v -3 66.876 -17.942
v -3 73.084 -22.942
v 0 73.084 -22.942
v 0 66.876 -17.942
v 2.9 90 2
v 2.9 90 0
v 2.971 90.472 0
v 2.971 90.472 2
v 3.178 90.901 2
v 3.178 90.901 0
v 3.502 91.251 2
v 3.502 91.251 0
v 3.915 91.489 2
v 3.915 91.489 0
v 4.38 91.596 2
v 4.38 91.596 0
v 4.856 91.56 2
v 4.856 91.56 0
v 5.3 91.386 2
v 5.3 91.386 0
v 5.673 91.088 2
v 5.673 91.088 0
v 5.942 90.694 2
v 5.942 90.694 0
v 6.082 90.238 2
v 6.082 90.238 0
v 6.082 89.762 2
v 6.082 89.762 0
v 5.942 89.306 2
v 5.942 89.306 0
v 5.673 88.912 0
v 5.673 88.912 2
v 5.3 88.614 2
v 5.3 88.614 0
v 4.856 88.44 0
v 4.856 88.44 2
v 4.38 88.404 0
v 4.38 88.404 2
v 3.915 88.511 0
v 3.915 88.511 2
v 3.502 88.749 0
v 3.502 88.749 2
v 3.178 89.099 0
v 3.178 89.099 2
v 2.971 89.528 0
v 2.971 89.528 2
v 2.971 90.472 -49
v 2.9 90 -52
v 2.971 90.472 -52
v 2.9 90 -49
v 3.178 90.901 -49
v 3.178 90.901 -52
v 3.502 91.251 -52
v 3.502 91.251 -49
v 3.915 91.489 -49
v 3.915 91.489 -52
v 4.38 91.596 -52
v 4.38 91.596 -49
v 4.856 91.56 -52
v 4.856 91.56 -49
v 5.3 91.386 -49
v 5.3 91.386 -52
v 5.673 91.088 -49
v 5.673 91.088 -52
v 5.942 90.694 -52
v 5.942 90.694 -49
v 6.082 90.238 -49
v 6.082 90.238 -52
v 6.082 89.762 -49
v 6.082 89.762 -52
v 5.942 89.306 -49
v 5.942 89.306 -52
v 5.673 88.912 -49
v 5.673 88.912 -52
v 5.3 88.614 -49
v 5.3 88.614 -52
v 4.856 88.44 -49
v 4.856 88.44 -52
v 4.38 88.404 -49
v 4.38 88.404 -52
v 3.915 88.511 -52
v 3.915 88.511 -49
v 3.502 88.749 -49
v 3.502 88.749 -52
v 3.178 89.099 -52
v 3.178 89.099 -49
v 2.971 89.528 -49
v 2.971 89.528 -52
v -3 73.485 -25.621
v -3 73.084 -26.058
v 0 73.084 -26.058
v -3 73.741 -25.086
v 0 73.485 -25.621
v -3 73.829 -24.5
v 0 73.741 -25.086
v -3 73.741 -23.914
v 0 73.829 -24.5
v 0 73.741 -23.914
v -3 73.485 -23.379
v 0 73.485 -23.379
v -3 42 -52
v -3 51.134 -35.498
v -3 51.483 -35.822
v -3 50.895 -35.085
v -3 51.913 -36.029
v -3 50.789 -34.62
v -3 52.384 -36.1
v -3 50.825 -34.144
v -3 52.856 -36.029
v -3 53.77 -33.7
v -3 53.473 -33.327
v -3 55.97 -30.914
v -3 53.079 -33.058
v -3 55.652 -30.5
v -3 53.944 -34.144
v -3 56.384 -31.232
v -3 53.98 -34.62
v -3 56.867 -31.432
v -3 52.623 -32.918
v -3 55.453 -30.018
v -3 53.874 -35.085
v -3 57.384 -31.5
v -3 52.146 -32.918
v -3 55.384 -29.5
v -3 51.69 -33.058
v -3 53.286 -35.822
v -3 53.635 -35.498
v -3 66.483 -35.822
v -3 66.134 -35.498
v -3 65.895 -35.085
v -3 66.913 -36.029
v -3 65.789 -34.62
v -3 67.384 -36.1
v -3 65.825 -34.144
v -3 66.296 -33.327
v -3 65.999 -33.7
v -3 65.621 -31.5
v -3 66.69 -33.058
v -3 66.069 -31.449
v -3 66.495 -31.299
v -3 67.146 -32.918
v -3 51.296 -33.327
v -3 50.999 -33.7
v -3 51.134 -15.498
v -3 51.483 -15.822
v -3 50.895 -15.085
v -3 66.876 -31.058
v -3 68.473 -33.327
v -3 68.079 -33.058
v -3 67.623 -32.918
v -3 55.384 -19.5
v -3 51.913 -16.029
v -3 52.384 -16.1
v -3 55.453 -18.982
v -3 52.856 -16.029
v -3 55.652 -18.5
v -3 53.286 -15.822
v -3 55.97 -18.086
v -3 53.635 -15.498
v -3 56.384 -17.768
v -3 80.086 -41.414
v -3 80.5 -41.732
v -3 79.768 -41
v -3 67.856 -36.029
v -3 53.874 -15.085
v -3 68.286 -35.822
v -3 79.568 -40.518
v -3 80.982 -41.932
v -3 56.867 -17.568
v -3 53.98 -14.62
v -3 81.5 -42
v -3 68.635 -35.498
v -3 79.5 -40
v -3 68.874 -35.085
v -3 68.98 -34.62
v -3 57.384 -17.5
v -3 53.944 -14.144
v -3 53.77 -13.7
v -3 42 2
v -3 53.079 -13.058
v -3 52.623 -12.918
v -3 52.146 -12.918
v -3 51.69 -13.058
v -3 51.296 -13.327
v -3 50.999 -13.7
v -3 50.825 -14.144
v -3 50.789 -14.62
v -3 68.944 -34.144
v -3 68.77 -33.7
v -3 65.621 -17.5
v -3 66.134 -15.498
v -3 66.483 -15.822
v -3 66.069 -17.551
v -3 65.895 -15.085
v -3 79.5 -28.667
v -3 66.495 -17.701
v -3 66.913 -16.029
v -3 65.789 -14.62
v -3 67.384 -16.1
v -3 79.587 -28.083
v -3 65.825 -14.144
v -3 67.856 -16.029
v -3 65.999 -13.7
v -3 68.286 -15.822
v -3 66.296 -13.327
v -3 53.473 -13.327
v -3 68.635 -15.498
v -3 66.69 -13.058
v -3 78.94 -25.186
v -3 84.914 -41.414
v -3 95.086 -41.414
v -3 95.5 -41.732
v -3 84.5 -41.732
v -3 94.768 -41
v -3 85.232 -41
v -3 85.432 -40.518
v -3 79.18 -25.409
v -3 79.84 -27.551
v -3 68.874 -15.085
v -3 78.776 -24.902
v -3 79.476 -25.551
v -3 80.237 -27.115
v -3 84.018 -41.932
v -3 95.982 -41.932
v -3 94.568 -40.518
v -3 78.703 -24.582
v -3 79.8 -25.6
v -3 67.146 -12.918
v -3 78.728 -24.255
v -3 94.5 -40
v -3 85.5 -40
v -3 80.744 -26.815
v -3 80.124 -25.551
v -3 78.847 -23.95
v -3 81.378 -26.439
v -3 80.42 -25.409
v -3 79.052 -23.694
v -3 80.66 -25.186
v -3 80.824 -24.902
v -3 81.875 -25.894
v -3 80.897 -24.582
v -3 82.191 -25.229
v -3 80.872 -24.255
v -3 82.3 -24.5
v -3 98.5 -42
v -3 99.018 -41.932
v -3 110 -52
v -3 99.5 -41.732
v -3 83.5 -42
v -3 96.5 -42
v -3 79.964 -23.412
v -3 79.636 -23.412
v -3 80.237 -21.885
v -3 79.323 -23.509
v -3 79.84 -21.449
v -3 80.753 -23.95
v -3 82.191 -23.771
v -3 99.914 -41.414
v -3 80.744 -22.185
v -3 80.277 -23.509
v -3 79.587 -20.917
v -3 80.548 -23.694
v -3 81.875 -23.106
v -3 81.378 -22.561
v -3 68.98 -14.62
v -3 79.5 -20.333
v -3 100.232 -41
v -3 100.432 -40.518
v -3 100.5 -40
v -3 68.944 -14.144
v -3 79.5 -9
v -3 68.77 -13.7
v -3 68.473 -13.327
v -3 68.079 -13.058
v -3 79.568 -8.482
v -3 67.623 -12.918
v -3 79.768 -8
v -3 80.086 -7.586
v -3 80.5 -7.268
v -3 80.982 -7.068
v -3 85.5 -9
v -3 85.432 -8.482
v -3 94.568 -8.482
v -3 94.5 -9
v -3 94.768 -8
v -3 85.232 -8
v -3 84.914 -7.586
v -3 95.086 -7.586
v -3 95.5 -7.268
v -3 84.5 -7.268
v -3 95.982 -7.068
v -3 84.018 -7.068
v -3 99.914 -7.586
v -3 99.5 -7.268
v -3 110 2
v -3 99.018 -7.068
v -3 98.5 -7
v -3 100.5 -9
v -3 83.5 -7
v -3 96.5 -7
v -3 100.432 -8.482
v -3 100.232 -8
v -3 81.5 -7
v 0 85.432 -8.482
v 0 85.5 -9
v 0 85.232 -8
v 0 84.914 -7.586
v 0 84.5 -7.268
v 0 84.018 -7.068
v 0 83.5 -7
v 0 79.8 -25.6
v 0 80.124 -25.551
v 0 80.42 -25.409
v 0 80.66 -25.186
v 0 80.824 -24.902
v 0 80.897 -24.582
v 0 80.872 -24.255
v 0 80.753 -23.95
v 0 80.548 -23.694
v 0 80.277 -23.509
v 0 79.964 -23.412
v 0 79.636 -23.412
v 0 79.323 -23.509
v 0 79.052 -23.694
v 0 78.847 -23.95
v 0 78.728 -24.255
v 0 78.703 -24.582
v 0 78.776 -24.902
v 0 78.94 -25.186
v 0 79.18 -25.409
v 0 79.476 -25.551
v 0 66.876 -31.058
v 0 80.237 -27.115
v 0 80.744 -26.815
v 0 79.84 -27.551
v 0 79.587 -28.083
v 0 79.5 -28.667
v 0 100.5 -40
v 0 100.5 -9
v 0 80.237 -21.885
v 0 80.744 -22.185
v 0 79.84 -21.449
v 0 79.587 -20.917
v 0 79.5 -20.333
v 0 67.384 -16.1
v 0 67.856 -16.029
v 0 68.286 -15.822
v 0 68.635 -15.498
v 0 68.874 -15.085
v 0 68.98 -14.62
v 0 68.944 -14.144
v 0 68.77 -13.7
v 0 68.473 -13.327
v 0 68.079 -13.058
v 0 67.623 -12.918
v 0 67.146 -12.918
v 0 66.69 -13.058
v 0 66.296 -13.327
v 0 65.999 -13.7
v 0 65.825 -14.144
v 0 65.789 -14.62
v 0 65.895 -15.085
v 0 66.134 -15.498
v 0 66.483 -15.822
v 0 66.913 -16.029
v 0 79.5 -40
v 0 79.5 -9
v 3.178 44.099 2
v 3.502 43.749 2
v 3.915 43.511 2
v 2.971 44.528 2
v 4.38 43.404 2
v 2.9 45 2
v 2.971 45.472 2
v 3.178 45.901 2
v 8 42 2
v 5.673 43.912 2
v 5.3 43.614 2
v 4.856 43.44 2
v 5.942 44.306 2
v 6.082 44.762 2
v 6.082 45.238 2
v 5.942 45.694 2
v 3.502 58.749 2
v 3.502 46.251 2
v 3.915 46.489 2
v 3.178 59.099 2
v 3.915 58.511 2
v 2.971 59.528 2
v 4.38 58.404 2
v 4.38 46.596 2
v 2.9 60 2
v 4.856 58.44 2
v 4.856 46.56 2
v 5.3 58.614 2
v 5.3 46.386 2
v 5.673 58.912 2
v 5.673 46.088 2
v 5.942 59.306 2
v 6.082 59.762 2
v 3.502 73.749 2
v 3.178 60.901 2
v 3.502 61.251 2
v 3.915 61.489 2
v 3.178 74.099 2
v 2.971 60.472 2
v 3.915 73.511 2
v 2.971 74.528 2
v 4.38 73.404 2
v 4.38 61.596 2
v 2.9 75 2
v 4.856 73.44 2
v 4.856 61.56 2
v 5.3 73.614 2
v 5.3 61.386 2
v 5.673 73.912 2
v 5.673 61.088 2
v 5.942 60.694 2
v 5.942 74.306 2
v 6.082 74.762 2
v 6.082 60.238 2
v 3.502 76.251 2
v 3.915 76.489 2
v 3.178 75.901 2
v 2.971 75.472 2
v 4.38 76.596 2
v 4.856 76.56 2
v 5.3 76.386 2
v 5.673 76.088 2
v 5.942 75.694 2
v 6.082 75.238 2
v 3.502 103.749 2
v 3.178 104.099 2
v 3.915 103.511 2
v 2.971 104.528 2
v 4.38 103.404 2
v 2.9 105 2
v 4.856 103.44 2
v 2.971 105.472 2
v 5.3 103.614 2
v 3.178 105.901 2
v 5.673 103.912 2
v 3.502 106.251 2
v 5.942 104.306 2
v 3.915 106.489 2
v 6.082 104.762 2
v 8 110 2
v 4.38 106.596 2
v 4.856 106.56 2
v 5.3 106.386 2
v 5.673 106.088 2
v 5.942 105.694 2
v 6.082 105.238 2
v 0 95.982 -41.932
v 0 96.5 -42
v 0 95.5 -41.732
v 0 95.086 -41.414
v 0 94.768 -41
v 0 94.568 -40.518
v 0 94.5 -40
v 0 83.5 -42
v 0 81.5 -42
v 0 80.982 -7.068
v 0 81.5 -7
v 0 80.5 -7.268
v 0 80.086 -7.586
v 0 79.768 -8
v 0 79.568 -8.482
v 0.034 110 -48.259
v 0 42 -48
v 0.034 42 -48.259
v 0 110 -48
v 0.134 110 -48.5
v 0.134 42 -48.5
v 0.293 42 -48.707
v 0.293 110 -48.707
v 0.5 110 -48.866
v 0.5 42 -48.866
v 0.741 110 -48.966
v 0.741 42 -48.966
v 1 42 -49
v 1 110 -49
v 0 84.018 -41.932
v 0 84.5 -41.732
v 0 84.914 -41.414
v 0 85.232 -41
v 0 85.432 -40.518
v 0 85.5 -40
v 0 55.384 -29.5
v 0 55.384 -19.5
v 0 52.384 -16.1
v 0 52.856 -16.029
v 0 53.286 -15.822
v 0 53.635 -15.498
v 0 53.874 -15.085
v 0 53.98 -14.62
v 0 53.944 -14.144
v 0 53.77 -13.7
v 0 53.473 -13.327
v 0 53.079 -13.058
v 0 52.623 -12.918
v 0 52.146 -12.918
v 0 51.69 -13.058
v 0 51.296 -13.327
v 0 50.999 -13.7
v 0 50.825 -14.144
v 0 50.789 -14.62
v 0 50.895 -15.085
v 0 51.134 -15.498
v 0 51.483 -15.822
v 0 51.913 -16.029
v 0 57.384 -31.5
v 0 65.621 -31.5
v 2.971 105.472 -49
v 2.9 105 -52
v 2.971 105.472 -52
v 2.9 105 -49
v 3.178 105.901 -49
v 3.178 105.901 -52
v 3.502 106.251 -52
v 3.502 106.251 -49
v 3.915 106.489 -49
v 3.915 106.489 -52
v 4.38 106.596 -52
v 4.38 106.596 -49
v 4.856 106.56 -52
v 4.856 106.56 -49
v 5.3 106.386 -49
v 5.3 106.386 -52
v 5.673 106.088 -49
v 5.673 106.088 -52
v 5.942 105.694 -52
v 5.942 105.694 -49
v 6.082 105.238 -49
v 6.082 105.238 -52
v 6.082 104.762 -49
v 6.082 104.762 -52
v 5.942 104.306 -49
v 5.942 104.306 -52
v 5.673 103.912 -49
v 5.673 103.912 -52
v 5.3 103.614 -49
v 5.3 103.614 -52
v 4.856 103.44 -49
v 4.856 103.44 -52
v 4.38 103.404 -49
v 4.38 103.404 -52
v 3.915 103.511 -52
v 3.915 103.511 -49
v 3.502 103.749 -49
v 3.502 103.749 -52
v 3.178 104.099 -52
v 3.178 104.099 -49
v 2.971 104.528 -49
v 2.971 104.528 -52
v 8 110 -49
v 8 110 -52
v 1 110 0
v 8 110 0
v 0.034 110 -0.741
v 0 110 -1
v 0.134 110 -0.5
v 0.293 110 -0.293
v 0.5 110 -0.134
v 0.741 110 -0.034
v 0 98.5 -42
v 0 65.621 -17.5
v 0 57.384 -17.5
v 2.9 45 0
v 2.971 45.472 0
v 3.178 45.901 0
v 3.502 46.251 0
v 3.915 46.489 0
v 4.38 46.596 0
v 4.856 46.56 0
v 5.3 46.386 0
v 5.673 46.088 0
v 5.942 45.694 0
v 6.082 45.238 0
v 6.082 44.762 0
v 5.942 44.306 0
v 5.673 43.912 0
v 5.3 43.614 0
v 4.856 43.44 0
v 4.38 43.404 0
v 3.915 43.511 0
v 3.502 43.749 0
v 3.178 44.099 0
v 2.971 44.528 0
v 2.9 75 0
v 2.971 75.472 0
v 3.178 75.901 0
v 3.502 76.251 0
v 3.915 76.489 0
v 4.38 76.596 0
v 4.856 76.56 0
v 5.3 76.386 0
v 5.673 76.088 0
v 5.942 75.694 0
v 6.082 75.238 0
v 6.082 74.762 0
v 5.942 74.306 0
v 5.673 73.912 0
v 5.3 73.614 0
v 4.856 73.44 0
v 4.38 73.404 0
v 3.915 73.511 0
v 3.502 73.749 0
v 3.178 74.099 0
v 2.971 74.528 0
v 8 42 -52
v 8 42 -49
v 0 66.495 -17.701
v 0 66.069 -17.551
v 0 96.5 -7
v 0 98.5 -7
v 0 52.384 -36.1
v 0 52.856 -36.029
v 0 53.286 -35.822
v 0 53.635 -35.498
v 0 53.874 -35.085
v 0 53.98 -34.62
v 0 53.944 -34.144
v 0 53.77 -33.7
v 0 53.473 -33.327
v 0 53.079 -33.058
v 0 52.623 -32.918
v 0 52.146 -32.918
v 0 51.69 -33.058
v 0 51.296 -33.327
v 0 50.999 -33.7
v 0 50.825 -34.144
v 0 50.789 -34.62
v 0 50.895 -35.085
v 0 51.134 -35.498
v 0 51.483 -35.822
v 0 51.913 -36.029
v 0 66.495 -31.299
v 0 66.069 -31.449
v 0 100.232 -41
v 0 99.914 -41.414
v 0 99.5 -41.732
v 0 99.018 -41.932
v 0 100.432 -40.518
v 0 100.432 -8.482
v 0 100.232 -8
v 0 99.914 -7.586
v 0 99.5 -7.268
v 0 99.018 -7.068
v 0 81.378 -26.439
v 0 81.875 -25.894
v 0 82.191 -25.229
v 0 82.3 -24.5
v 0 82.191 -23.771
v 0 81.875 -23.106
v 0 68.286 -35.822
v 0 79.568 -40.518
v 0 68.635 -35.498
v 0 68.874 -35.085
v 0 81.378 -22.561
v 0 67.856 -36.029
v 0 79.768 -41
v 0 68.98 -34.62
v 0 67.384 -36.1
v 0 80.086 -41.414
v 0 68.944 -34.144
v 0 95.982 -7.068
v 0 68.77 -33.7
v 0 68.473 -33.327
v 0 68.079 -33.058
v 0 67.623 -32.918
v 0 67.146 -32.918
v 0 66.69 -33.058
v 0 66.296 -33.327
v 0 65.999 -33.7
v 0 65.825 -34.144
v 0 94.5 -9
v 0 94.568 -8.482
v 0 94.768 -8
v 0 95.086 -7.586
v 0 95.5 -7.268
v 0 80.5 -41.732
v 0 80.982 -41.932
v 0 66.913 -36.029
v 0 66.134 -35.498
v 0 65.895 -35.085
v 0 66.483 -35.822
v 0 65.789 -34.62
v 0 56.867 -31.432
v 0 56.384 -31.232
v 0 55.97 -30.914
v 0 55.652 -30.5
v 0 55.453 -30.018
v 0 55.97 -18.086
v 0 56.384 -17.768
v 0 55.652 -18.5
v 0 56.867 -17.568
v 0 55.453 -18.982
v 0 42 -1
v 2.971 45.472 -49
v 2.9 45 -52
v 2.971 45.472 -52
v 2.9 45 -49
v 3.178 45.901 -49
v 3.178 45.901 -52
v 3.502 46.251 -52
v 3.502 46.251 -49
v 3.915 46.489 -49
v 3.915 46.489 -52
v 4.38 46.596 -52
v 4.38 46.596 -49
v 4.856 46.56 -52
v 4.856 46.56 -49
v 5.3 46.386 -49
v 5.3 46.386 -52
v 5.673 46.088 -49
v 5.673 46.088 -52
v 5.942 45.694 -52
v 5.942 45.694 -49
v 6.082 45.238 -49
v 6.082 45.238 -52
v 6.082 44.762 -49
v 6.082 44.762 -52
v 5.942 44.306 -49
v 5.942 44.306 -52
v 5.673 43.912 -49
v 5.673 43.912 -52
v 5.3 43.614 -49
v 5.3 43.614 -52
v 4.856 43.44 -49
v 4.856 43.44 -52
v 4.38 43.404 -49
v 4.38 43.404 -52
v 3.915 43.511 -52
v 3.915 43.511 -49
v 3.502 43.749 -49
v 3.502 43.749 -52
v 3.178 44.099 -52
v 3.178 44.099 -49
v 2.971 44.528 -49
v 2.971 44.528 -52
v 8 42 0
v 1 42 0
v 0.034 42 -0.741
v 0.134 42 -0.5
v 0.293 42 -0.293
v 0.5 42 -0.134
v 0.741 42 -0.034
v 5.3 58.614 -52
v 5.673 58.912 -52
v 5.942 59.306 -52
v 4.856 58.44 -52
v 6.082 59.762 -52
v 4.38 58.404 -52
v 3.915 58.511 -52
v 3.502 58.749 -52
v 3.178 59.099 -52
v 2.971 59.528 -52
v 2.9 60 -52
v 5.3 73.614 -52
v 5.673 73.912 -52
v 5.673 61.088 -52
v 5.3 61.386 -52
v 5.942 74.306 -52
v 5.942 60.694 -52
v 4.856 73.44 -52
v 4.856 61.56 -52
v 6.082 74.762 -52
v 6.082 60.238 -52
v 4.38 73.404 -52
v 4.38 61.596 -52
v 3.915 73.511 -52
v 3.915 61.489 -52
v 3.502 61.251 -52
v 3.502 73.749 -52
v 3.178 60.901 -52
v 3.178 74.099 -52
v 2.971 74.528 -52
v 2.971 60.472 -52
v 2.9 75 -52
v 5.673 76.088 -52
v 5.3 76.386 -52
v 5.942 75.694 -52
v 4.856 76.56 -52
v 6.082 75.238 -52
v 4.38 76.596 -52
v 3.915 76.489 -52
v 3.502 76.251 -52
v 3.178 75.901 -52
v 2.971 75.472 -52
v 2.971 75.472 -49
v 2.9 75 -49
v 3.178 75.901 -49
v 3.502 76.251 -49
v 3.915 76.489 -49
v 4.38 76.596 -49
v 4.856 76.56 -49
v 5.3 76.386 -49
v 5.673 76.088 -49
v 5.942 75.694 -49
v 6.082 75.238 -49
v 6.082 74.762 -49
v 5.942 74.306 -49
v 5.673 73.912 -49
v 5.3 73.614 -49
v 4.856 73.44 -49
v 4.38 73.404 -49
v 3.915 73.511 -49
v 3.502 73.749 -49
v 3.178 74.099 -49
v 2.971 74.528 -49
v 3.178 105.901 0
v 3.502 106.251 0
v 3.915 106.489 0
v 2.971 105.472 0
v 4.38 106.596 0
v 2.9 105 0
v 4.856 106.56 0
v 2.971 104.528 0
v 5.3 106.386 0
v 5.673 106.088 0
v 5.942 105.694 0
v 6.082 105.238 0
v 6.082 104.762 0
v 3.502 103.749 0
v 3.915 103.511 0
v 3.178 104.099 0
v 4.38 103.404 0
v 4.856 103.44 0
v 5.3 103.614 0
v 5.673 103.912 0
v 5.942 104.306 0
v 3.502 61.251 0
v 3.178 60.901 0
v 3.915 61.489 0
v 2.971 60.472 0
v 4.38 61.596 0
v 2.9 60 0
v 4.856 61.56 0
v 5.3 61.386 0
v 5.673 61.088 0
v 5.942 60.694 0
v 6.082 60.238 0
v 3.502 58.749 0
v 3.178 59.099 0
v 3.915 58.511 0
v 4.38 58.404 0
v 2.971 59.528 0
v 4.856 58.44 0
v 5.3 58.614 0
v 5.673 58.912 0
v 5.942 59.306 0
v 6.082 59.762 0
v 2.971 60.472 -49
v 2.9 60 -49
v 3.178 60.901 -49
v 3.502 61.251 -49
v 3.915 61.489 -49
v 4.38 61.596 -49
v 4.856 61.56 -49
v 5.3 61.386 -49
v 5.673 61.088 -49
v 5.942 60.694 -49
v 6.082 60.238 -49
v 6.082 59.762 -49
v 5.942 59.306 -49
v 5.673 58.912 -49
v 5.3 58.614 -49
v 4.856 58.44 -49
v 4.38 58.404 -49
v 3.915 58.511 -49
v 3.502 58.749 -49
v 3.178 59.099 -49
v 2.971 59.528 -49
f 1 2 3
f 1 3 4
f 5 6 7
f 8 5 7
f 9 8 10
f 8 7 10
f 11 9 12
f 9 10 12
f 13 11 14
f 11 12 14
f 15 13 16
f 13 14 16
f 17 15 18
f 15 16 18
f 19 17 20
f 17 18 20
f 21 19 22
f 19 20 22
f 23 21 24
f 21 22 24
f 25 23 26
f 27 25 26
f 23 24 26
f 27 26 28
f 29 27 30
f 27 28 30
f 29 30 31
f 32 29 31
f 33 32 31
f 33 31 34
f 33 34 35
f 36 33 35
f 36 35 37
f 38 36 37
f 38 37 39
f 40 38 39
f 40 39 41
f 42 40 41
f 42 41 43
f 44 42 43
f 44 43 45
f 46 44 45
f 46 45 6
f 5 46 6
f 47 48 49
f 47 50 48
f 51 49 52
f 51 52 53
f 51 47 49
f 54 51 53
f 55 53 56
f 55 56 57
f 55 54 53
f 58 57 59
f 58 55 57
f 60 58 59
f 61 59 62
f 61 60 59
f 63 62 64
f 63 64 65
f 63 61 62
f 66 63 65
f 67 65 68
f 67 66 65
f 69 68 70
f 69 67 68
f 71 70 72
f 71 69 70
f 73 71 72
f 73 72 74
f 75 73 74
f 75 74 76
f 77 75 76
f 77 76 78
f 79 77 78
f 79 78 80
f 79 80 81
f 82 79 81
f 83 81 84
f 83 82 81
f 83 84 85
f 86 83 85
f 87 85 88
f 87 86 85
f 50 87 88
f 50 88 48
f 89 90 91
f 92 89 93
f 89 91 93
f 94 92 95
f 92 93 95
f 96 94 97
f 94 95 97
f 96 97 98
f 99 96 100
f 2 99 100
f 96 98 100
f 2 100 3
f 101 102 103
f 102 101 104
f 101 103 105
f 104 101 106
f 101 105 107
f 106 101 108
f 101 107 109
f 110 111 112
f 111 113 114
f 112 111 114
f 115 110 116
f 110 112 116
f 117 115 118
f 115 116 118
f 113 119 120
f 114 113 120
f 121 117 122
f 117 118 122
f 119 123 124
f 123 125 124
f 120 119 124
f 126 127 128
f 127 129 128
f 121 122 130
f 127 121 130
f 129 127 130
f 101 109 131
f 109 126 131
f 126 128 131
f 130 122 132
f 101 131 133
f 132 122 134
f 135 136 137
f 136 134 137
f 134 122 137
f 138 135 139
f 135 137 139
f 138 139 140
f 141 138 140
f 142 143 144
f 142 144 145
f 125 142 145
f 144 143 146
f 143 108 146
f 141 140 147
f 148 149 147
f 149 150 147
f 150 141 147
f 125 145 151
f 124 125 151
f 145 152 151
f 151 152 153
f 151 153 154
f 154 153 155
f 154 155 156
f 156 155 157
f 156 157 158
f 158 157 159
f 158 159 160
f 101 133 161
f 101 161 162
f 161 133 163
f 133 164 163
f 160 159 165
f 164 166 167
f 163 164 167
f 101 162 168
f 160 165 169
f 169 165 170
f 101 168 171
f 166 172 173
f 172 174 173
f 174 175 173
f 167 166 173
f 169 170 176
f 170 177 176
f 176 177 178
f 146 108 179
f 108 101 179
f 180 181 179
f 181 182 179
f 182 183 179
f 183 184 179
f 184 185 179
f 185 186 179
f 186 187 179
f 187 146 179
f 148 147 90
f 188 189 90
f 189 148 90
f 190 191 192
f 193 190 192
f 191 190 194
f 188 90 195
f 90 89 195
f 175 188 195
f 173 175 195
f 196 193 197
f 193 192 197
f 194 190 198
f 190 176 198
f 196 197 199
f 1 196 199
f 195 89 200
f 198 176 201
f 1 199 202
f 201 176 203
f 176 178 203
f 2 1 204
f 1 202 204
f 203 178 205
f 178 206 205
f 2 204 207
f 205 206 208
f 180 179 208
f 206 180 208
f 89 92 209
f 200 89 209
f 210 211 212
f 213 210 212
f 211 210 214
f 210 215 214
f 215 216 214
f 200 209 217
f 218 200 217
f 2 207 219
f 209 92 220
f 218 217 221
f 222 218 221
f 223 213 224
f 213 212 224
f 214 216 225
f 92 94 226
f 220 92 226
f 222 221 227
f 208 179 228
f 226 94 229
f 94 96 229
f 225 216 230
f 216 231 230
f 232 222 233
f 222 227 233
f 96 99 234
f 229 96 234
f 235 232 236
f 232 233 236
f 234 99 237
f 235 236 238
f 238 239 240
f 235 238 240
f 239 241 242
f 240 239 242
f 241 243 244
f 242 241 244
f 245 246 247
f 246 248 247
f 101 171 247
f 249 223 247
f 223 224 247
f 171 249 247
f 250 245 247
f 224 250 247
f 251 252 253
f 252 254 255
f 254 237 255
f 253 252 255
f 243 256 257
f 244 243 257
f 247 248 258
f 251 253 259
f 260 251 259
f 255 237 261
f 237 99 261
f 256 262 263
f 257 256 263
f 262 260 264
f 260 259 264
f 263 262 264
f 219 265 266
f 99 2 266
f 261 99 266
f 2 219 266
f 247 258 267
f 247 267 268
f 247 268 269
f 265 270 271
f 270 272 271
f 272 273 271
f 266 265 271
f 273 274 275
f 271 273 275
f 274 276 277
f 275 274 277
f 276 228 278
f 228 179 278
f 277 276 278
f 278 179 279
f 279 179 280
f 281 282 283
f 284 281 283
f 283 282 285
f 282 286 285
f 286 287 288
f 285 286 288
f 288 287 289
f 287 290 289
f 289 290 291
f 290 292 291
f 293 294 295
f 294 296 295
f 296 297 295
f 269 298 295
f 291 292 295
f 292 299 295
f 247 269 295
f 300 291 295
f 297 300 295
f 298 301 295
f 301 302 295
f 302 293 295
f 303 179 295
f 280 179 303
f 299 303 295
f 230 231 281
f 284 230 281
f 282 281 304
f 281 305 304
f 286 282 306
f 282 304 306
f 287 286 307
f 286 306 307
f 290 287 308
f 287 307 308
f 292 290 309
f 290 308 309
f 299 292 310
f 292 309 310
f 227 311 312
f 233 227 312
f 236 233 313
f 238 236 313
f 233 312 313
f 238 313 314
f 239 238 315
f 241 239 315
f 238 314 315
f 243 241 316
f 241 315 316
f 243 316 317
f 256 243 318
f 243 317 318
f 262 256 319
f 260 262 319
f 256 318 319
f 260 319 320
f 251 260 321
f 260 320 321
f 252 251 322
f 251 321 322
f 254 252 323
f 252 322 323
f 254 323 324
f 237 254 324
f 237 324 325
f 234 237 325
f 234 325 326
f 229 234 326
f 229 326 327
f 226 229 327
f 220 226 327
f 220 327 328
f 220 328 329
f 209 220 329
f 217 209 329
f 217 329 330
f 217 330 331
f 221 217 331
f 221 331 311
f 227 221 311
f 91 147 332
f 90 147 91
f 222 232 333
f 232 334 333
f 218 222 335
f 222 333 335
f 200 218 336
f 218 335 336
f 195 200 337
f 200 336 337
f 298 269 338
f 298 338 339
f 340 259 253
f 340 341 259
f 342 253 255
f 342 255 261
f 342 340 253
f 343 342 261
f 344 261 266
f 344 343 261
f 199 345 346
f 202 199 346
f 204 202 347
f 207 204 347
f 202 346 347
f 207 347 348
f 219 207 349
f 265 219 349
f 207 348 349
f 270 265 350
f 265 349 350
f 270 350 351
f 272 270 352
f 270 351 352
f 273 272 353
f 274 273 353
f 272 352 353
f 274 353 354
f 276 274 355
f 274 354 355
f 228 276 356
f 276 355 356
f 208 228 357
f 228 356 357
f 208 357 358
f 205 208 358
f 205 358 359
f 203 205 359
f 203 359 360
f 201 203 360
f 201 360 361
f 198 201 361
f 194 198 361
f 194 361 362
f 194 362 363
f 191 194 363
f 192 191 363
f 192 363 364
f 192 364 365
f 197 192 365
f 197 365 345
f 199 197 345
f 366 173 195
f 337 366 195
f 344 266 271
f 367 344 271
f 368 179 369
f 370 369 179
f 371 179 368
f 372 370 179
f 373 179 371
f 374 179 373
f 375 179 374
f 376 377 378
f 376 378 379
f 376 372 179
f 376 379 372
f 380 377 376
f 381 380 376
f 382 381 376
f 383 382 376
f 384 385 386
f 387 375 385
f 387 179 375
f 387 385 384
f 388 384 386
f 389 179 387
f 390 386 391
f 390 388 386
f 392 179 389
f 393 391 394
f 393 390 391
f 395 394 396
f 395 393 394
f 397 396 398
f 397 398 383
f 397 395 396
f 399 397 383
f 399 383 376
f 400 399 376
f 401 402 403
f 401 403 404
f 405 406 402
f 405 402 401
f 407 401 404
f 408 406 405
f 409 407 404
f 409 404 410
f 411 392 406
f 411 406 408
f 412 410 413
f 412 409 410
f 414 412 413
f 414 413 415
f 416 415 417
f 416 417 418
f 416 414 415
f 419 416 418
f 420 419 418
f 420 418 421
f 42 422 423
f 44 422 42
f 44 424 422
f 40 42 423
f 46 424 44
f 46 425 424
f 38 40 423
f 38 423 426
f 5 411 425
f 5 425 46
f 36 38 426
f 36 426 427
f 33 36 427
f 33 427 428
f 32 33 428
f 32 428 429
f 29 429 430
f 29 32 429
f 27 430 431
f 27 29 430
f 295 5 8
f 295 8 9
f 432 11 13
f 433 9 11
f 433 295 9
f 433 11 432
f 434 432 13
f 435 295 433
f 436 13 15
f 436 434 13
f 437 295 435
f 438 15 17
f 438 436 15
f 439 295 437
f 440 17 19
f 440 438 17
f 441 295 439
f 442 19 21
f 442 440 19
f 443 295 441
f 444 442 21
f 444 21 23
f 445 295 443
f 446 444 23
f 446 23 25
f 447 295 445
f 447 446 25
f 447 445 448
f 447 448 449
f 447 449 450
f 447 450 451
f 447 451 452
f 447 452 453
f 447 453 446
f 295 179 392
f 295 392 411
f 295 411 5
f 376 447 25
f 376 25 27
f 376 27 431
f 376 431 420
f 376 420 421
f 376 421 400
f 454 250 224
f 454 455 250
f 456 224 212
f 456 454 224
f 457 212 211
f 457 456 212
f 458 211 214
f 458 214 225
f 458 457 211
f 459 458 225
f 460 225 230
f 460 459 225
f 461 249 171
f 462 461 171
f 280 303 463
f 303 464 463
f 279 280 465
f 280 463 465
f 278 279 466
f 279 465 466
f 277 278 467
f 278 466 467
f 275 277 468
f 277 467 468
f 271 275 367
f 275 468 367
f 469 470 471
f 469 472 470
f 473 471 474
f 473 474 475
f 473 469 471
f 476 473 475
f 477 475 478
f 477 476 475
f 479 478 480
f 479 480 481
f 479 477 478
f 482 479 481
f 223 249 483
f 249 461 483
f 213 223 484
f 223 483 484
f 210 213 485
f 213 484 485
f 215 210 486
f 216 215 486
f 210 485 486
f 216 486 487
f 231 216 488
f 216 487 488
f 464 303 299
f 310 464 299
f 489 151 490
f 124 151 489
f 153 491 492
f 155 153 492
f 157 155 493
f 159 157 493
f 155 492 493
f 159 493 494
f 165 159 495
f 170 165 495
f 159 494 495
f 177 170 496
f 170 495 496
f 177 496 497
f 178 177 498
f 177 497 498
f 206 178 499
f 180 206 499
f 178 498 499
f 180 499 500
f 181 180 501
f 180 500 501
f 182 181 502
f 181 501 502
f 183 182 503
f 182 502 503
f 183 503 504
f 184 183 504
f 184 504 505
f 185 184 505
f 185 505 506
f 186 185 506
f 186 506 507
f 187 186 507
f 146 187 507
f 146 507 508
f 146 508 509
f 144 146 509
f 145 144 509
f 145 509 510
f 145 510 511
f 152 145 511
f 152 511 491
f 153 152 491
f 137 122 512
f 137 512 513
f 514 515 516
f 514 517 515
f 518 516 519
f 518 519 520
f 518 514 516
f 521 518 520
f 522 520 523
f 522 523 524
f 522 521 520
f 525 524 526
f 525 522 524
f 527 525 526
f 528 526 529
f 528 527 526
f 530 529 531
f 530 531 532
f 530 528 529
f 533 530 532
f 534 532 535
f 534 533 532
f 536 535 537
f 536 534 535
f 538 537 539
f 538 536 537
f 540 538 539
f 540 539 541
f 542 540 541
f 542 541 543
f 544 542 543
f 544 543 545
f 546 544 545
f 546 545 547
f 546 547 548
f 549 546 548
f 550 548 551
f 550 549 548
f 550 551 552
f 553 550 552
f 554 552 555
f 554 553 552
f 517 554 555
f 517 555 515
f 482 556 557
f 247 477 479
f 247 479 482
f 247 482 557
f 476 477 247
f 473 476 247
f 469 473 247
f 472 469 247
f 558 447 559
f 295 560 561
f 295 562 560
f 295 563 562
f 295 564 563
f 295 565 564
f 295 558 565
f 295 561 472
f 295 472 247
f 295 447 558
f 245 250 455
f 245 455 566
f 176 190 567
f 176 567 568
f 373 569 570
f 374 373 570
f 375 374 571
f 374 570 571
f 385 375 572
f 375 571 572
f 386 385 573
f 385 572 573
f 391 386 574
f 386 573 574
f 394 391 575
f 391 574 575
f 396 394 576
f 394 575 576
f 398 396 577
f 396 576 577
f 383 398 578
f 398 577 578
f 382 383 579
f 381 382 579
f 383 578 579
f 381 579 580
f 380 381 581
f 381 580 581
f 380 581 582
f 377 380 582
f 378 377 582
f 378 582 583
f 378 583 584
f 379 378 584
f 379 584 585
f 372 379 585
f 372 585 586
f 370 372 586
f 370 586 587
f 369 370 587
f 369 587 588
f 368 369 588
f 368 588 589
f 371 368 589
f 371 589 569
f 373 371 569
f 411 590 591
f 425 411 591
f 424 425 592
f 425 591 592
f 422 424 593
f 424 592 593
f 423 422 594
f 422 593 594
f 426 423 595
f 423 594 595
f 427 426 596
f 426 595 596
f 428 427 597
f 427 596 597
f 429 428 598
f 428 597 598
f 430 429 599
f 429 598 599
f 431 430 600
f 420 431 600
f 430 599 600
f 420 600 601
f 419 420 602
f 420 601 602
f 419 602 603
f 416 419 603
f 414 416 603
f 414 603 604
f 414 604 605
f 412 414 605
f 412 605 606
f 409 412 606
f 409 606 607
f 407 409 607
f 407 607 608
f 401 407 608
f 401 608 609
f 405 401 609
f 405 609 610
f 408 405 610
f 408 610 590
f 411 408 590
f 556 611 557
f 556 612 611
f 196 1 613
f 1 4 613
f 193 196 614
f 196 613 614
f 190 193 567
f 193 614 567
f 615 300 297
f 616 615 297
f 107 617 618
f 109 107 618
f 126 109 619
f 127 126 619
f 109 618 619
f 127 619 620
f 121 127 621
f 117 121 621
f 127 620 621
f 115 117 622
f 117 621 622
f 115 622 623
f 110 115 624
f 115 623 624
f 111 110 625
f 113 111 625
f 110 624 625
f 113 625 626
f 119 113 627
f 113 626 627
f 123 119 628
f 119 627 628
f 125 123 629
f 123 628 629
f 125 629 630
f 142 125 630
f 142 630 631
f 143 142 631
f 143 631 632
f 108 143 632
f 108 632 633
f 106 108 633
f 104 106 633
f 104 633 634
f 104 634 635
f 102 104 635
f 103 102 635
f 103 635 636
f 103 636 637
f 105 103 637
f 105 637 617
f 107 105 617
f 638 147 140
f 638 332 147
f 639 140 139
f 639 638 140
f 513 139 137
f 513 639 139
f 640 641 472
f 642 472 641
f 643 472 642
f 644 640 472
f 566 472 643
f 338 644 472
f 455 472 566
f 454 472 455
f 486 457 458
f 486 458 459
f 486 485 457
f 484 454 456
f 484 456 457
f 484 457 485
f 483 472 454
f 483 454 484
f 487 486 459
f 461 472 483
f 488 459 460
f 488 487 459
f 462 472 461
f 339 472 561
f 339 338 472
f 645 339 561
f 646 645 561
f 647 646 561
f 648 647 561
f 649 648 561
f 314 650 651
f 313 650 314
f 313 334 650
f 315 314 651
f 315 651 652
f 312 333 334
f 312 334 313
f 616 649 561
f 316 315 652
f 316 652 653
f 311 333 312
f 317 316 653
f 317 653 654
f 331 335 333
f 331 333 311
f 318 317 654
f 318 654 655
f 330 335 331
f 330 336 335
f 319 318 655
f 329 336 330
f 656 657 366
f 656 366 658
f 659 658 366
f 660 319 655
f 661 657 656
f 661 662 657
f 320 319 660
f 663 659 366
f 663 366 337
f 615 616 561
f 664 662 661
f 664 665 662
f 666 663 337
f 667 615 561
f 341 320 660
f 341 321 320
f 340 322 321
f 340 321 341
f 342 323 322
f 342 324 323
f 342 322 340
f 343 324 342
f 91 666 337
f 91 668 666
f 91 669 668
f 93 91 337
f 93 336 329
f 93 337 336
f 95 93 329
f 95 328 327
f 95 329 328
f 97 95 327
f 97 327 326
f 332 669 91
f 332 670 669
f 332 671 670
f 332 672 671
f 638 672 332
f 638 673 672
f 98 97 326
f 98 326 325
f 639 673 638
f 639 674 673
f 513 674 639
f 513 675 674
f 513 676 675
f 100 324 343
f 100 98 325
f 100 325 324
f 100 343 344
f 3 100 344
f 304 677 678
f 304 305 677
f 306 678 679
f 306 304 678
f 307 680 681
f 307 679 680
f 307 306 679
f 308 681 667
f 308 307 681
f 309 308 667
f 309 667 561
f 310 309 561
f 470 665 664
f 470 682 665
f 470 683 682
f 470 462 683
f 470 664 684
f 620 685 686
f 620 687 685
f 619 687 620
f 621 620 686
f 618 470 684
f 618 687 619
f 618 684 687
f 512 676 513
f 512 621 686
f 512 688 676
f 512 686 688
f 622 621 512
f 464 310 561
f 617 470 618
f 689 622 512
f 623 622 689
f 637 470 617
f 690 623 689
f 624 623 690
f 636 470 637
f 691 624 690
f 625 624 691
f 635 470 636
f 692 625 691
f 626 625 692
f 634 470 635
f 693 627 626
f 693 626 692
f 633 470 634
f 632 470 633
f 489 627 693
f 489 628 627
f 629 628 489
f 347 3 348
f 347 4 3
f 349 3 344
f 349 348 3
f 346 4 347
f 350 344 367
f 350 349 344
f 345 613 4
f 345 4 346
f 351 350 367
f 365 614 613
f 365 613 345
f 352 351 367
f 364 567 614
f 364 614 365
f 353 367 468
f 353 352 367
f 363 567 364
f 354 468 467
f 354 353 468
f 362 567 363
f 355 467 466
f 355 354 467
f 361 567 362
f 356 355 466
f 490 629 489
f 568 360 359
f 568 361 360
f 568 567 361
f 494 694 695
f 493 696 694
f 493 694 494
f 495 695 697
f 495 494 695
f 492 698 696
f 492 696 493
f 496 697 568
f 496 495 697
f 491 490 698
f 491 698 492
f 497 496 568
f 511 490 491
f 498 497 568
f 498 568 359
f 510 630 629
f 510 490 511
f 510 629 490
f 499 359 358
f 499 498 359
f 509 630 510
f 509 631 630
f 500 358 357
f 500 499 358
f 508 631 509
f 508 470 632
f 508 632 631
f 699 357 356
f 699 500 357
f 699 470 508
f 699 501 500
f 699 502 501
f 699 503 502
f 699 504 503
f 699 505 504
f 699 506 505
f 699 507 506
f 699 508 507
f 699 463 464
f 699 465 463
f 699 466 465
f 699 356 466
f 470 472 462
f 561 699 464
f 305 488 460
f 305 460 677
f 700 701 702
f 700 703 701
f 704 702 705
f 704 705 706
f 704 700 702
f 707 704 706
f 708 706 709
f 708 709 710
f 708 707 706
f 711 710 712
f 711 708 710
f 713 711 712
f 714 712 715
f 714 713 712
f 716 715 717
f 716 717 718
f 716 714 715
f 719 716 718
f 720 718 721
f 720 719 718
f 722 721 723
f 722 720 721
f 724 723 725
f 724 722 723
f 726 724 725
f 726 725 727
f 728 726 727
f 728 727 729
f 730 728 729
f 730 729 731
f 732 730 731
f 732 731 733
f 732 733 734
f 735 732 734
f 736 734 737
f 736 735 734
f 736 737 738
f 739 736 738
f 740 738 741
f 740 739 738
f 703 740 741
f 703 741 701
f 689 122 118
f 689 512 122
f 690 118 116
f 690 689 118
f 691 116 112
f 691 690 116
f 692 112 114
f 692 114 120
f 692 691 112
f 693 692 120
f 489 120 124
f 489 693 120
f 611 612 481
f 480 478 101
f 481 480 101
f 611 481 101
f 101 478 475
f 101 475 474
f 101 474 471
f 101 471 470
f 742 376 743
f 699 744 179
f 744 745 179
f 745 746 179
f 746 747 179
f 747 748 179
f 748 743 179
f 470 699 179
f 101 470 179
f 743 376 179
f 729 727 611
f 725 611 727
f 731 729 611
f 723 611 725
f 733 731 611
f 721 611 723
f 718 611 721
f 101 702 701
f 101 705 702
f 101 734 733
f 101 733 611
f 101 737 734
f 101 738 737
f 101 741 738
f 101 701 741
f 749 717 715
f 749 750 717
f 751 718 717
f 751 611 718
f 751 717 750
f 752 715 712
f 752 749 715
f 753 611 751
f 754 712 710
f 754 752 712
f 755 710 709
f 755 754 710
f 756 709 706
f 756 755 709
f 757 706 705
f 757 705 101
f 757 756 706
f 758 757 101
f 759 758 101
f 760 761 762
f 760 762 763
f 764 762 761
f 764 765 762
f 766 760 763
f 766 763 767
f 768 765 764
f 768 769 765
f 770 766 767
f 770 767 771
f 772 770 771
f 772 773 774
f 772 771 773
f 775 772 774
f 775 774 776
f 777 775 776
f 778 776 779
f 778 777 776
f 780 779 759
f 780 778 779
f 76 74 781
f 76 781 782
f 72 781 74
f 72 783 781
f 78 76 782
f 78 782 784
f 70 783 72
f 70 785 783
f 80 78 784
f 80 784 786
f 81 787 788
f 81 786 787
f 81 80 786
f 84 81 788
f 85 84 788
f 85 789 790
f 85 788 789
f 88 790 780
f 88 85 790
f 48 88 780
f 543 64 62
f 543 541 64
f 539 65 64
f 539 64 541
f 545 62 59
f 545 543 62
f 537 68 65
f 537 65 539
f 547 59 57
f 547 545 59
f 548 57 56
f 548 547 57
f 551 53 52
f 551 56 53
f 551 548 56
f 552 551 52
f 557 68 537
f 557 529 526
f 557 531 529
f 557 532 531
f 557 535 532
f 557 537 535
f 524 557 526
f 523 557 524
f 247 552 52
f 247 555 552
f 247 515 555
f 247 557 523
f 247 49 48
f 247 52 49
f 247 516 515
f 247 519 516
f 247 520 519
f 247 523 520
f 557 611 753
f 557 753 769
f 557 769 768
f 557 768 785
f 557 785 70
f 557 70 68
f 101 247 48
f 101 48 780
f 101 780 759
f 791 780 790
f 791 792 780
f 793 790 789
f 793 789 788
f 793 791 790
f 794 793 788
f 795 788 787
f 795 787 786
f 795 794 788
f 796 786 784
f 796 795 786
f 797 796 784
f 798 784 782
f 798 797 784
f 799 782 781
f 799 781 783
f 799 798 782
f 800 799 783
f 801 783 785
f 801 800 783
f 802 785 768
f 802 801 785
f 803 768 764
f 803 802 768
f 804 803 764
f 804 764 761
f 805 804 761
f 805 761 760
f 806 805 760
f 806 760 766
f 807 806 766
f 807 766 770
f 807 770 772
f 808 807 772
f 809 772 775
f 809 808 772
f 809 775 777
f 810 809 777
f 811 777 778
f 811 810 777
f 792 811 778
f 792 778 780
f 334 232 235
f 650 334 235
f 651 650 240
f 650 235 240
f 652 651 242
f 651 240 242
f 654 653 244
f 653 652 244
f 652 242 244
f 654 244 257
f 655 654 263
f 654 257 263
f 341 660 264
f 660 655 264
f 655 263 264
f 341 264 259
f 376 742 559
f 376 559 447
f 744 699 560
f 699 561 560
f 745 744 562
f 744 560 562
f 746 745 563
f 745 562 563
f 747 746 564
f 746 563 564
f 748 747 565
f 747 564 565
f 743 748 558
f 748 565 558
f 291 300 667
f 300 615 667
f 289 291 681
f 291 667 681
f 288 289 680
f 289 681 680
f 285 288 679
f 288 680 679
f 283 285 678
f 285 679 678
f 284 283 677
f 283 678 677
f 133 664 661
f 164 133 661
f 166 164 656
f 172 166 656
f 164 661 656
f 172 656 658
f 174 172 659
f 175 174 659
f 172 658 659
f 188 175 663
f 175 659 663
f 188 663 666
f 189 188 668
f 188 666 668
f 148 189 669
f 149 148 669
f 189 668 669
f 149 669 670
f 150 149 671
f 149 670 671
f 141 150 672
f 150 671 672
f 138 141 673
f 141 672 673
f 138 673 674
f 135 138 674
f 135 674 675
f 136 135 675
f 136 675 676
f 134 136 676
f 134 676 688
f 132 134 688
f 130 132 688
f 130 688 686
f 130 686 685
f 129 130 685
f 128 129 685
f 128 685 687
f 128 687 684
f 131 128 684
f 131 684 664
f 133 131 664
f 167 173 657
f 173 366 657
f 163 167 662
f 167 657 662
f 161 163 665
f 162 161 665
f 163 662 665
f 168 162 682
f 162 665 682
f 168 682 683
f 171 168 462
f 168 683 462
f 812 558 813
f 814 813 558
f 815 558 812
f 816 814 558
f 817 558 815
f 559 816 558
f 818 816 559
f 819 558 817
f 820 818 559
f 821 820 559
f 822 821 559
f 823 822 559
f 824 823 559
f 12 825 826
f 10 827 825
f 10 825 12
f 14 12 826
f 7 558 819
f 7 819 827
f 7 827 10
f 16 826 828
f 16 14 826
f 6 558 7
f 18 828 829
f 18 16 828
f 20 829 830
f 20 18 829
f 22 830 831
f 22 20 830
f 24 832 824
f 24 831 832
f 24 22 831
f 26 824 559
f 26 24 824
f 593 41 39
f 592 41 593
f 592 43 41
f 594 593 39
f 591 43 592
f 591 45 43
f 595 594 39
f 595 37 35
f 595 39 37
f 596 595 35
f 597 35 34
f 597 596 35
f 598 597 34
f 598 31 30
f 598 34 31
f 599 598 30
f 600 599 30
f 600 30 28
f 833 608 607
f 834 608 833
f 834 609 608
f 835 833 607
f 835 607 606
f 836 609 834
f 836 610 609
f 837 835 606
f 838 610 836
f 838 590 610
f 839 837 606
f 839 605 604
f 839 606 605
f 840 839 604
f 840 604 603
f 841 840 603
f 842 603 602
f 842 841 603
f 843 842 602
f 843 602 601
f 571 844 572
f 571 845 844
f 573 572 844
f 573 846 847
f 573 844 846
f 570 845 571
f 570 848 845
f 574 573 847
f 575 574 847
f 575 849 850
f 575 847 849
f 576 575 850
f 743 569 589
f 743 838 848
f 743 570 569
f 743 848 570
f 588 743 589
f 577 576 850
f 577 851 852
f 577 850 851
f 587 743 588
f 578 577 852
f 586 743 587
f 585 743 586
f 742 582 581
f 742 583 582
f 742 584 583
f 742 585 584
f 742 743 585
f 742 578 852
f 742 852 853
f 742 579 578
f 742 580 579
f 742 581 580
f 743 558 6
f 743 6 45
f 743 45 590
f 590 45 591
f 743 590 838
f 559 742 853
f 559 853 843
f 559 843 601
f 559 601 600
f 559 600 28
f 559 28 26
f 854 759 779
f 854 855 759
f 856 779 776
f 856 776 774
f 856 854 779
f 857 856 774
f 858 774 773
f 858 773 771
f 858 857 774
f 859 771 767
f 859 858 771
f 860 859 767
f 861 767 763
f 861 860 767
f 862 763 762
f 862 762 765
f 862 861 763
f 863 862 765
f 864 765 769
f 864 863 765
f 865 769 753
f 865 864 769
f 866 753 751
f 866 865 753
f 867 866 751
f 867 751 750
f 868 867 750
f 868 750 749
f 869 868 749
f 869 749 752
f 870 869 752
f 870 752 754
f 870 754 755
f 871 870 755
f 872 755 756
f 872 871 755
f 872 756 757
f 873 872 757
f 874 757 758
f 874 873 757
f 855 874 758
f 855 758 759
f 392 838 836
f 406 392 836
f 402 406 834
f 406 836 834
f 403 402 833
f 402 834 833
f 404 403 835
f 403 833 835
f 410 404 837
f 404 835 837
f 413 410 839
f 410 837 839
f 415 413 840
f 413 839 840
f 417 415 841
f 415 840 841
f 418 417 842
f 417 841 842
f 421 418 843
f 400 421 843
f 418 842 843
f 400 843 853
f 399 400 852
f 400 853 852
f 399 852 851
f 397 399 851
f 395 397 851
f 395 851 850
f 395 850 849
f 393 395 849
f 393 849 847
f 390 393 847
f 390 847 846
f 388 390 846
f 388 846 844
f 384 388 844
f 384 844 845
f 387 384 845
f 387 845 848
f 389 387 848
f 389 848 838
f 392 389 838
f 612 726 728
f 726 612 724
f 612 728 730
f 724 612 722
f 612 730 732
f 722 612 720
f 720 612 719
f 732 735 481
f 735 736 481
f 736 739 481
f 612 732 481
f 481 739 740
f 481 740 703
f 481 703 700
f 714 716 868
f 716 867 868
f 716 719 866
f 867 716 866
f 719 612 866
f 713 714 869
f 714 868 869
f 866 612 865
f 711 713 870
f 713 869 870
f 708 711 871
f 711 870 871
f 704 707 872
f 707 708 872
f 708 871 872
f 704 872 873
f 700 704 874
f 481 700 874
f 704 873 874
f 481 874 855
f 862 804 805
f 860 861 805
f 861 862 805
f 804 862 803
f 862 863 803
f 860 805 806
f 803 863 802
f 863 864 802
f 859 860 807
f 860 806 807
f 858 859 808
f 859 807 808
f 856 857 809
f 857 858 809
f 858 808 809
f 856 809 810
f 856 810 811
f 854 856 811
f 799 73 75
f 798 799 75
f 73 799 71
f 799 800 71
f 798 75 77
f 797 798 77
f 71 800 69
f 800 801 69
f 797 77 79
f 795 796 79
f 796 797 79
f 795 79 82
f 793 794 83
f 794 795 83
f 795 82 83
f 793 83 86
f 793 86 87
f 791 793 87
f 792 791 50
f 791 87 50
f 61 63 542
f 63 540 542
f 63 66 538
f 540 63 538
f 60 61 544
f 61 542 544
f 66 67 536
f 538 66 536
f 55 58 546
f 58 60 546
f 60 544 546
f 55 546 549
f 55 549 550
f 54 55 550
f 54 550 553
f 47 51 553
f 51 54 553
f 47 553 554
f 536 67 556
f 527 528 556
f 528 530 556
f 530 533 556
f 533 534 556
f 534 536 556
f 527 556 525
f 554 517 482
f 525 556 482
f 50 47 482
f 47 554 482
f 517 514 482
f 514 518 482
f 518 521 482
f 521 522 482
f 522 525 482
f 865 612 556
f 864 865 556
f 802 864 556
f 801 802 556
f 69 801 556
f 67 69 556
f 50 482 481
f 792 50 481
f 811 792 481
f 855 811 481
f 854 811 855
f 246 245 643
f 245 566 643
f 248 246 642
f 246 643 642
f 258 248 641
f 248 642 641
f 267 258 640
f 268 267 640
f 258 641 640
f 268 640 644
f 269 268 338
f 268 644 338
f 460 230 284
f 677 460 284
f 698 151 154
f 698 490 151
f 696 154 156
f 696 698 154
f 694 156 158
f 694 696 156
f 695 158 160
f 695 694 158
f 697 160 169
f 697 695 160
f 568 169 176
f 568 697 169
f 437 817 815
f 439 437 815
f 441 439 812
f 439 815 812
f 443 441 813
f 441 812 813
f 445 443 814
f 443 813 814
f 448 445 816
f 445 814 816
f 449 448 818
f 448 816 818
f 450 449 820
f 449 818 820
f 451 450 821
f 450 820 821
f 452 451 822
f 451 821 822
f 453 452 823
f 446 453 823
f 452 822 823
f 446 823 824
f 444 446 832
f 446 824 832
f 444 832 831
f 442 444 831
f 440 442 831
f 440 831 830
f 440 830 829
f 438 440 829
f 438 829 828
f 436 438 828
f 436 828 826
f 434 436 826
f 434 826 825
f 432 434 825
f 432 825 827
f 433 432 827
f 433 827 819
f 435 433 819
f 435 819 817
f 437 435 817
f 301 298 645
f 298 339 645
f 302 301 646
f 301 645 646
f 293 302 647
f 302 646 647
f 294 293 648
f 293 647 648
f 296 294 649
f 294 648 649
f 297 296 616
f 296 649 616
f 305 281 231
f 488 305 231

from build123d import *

# Parameters (mm, degrees)
EXTRUDE_1_DEPTH          = 120
SKETCH_2_R               = 1.6
CUT_EXTRUDE_1_DEPTH      = 120
SKETCH_3_R               = 1.6
CUT_EXTRUDE_2_DEPTH      = 10
SKETCH_4_R               = 1.1
CUT_EXTRUDE_3_DEPTH      = 12
SKETCH_5_W               = 11
SKETCH_5_H               = 120
EXTRUDE_2_DEPTH          = 2
SKETCH_6_W               = 49
SKETCH_6_H               = 30
CUT_EXTRUDE_4_DEPTH      = 10
CUT_EXTRUDE_5_DEPTH      = 42
CUT_EXTRUDE_5_DEPTH_BACK = 16
SKETCH_7_W               = 3
SKETCH_7_H               = 30
CUT_EXTRUDE_6_DEPTH      = 35
CUT_EXTRUDE_6_DEPTH_BACK = 11
SKETCH_8_W               = 52
SKETCH_8_H               = 12
SKETCH_9_W               = 2
SKETCH_9_H               = 42
CUT_EXTRUDE_7_DEPTH      = 20
SKETCH_10_W              = 11
SKETCH_10_H              = 54
CUT_EXTRUDE_8_DEPTH      = 10
SKETCH_11_W              = 11
SKETCH_11_H              = 68
SKETCH_11_R              = 1.6
EXTRUDE_3_DEPTH          = 1
SKETCH_12_W              = 11
SKETCH_12_H              = 1
CUT_EXTRUDE_9_DEPTH      = 91
CUT_EXTRUDE_10_DEPTH     = 10
SKETCH_14_W              = 35
SKETCH_14_H              = 6
CUT_EXTRUDE_11_DEPTH     = 10
FILLET_1_R               = 2
FILLET_2_R               = 1


with BuildPart() as part:
    # 草图1 → 凸台-拉伸1 (new body)
    with BuildSketch(Plane(origin=(0, 0, 0), x_dir=(1, 0, 0), z_dir=(0, 1, 0))):
        Polygon((0, 0), (8, 0), (8, -3), (-3, -3), (-3, 49), (0, 49), align=None)
    extrude(amount=EXTRUDE_1_DEPTH)

    # 草图2 → 切除-拉伸1 (cut)
    with BuildSketch(Plane(origin=(0, 0, 0), x_dir=(-1, 0, 0), z_dir=(0, 0, -1))):
        with Locations((-4.5, 60)):
            Circle(SKETCH_2_R)
        with Locations((-4.5, 45)):
            Circle(SKETCH_2_R)
        with Locations((-4.5, 30)):
            Circle(SKETCH_2_R)
        with Locations((-4.5, 15)):
            Circle(SKETCH_2_R)
        with Locations((-4.5, 75)):
            Circle(SKETCH_2_R)
        with Locations((-4.5, 90)):
            Circle(SKETCH_2_R)
        with Locations((-4.5, 105)):
            Circle(SKETCH_2_R)
    cut_extrude_1 = extrude(amount=-CUT_EXTRUDE_1_DEPTH, mode=Mode.SUBTRACT)

    # 草图3 → 切除-拉伸2 (cut)
    with BuildSketch(Plane(origin=(0, 0, 0), x_dir=(0, 0, -1), z_dir=(1, 0, 0))):
        with Locations((14.5, 7.384470662)):
            Circle(SKETCH_3_R)
        with Locations((14.5, 22.384470662)):
            Circle(SKETCH_3_R)
        with Locations((14.5, 37.384470662)):
            Circle(SKETCH_3_R)
        with Locations((14.5, 52.384470662)):
            Circle(SKETCH_3_R)
        with Locations((14.5, 67.384470662)):
            Circle(SKETCH_3_R)
        with Locations((34.5, 67.384470662)):
            Circle(SKETCH_3_R)
        with Locations((34.5, 52.384470662)):
            Circle(SKETCH_3_R)
        with Locations((34.5, 37.384470662)):
            Circle(SKETCH_3_R)
        with Locations((34.5, 22.384470662)):
            Circle(SKETCH_3_R)
        with Locations((34.5, 7.384470662)):
            Circle(SKETCH_3_R)
    extrude(amount=-CUT_EXTRUDE_2_DEPTH, mode=Mode.SUBTRACT)

    # 草图4 → 切除-拉伸3 (cut)
    with BuildSketch(Plane(origin=(0, 0, 0), x_dir=(0, 0, -1), z_dir=(1, 0, 0))):
        with Locations((15.7, 117)):
            Circle(SKETCH_4_R)
        with Locations((33.3, 117)):
            Circle(SKETCH_4_R)
        with Locations((24.5, 79.8)):
            Circle(SKETCH_4_R)
    extrude(amount=-CUT_EXTRUDE_3_DEPTH, mode=Mode.SUBTRACT)

    # 草图5 → 凸台-拉伸2 (add)
    with BuildSketch(Plane(origin=(0, 0, -49), x_dir=(-1, 0, 0), z_dir=(0, 0, -1))):
        with Locations((-2.5, 60)):
            Rectangle(SKETCH_5_W, SKETCH_5_H)
    extrude(amount=EXTRUDE_2_DEPTH)

    # 镜向3: 切除-拉伸1 across plane
    add(cut_extrude_1.mirror(Plane(origin=(0, 0, -24.5), x_dir=(1, 0, 0), z_dir=(0, 0, -1))), mode=Mode.SUBTRACT)

    # 草图6 → 切除-拉伸4 (cut)
    with BuildSketch(Plane(origin=(0, 0, 0), x_dir=(0, 0, -1), z_dir=(1, 0, 0))):
        with Locations((24.5, 15)):
            Rectangle(SKETCH_6_W, SKETCH_6_H)
    extrude(amount=-CUT_EXTRUDE_4_DEPTH, mode=Mode.SUBTRACT)

    # 草图7 → 切除-拉伸5 (cut, two sides: drawn at the far end of the back side and taken through both)
    with BuildSketch(Plane(origin=(0, 0, 0), x_dir=(0, 0, -1), z_dir=(1, 0, 0)).offset(-CUT_EXTRUDE_5_DEPTH_BACK)):
        with Locations((-1.5, 15)):
            Rectangle(SKETCH_7_W, SKETCH_7_H)
    extrude(amount=CUT_EXTRUDE_5_DEPTH + CUT_EXTRUDE_5_DEPTH_BACK, mode=Mode.SUBTRACT)

    # 草图8 → 切除-拉伸6 (cut, two sides: drawn at the far end of the back side and taken through both)
    with BuildSketch(Plane(origin=(0, 0, 0), x_dir=(0, 0, -1), z_dir=(1, 0, 0)).offset(-CUT_EXTRUDE_6_DEPTH_BACK)):
        with Locations((23, 36)):
            Rectangle(SKETCH_8_W, SKETCH_8_H)
    extrude(amount=CUT_EXTRUDE_6_DEPTH + CUT_EXTRUDE_6_DEPTH_BACK, mode=Mode.SUBTRACT)

    # 草图9 → 切除-拉伸7 (cut)
    with BuildSketch(Plane.ZY.offset(3)):
        with Locations((-50, 21)):
            Rectangle(SKETCH_9_W, SKETCH_9_H)
    extrude(amount=-CUT_EXTRUDE_7_DEPTH, mode=Mode.SUBTRACT)

    # 草图10 → 切除-拉伸8 (cut)
    with BuildSketch(Plane(origin=(0, 120, 0), x_dir=(1, 0, 0), z_dir=(0, 1, 0))):
        with Locations((2.5, 24)):
            Rectangle(SKETCH_10_W, SKETCH_10_H)
    extrude(amount=-CUT_EXTRUDE_8_DEPTH, mode=Mode.SUBTRACT)

    # 草图11 → 凸台-拉伸3 (add)
    with BuildSketch(Plane(origin=(0, 0, -51), x_dir=(-1, 0, 0), z_dir=(0, 0, -1))):
        with Locations((-2.5, 76)):
            Rectangle(SKETCH_11_W, SKETCH_11_H)
        with Locations((-4.5, 105)):
            Circle(SKETCH_11_R, mode=Mode.SUBTRACT)
        with Locations((-4.5, 45)):
            Circle(SKETCH_11_R, mode=Mode.SUBTRACT)
        with Locations((-4.5, 60)):
            Circle(SKETCH_11_R, mode=Mode.SUBTRACT)
        with Locations((-4.5, 75)):
            Circle(SKETCH_11_R, mode=Mode.SUBTRACT)
        with Locations((-4.5, 90)):
            Circle(SKETCH_11_R, mode=Mode.SUBTRACT)
    extrude(amount=EXTRUDE_3_DEPTH)

    # 草图12 → 切除-拉伸9 (cut)
    with BuildSketch(Plane(origin=(0, 110, 0), x_dir=(1, 0, 0), z_dir=(0, 1, 0))):
        with Locations((2.5, -2.5)):
            Rectangle(SKETCH_12_W, SKETCH_12_H)
    extrude(amount=-CUT_EXTRUDE_9_DEPTH, mode=Mode.SUBTRACT)

    # 草图13 → 切除-拉伸10 (cut)
    with BuildSketch(Plane.ZY.offset(3)):
        Polygon((-31.5, 66.326548237), (-24.5, 75.017418774), (-17.5, 66.326548237), (-17.5, 55.384470662), (-31.5, 55.384470662), align=None)
    extrude(amount=-CUT_EXTRUDE_10_DEPTH, mode=Mode.SUBTRACT)

    # 草图14 → 切除-拉伸11 (cut)
    with BuildSketch(Plane.ZY.offset(3)):
        with Locations((-24.5, 97.5)):
            Rectangle(SKETCH_14_W, SKETCH_14_H)
        with BuildLine():
            Line((-22.018065271, 79.5), (-7, 79.5))
            Line((-7, 79.5), (-7, 85.5))
            Line((-7, 85.5), (-42, 85.5))
            Line((-42, 85.5), (-42, 79.5))
            Line((-42, 79.5), (-26.981934729, 79.5))
            ThreePointArc((-26.981934729, 79.5), (-24.5, 82.3), (-22.018065271, 79.5))
        make_face()
    extrude(amount=-CUT_EXTRUDE_11_DEPTH, mode=Mode.SUBTRACT)

    # 圆角1
    fillet_1_edges = [part.edges().sort_by_distance(p)[0] for p in [
        (-1.5, 55.384470662, -31.5),
        (-1.5, 66.326548237, -31.5),
        (-1.5, 75.017418774, -24.5),
        (-1.5, 66.326548237, -17.5),
        (-1.5, 55.384470662, -17.5),
        (-1.5, 100.5, -7),
        (-1.5, 94.5, -7),
        (-1.5, 94.5, -42),
        (-1.5, 100.5, -42),
        (-1.5, 85.5, -7),
        (-1.5, 79.5, -7),
        (-1.5, 79.5, -22.018065271),
        (-1.5, 79.5, -26.981934729),
        (-1.5, 79.5, -42),
        (-1.5, 85.5, -42),
    ]]
    fillet(fillet_1_edges, radius=FILLET_1_R)

    # 圆角2
    fillet_2_edges = [part.edges().sort_by_distance(p)[0] for p in [
        (0, 76, -49),
        (0, 76, 0),
    ]]
    fillet(fillet_2_edges, radius=FILLET_2_R)


solid = part.part
